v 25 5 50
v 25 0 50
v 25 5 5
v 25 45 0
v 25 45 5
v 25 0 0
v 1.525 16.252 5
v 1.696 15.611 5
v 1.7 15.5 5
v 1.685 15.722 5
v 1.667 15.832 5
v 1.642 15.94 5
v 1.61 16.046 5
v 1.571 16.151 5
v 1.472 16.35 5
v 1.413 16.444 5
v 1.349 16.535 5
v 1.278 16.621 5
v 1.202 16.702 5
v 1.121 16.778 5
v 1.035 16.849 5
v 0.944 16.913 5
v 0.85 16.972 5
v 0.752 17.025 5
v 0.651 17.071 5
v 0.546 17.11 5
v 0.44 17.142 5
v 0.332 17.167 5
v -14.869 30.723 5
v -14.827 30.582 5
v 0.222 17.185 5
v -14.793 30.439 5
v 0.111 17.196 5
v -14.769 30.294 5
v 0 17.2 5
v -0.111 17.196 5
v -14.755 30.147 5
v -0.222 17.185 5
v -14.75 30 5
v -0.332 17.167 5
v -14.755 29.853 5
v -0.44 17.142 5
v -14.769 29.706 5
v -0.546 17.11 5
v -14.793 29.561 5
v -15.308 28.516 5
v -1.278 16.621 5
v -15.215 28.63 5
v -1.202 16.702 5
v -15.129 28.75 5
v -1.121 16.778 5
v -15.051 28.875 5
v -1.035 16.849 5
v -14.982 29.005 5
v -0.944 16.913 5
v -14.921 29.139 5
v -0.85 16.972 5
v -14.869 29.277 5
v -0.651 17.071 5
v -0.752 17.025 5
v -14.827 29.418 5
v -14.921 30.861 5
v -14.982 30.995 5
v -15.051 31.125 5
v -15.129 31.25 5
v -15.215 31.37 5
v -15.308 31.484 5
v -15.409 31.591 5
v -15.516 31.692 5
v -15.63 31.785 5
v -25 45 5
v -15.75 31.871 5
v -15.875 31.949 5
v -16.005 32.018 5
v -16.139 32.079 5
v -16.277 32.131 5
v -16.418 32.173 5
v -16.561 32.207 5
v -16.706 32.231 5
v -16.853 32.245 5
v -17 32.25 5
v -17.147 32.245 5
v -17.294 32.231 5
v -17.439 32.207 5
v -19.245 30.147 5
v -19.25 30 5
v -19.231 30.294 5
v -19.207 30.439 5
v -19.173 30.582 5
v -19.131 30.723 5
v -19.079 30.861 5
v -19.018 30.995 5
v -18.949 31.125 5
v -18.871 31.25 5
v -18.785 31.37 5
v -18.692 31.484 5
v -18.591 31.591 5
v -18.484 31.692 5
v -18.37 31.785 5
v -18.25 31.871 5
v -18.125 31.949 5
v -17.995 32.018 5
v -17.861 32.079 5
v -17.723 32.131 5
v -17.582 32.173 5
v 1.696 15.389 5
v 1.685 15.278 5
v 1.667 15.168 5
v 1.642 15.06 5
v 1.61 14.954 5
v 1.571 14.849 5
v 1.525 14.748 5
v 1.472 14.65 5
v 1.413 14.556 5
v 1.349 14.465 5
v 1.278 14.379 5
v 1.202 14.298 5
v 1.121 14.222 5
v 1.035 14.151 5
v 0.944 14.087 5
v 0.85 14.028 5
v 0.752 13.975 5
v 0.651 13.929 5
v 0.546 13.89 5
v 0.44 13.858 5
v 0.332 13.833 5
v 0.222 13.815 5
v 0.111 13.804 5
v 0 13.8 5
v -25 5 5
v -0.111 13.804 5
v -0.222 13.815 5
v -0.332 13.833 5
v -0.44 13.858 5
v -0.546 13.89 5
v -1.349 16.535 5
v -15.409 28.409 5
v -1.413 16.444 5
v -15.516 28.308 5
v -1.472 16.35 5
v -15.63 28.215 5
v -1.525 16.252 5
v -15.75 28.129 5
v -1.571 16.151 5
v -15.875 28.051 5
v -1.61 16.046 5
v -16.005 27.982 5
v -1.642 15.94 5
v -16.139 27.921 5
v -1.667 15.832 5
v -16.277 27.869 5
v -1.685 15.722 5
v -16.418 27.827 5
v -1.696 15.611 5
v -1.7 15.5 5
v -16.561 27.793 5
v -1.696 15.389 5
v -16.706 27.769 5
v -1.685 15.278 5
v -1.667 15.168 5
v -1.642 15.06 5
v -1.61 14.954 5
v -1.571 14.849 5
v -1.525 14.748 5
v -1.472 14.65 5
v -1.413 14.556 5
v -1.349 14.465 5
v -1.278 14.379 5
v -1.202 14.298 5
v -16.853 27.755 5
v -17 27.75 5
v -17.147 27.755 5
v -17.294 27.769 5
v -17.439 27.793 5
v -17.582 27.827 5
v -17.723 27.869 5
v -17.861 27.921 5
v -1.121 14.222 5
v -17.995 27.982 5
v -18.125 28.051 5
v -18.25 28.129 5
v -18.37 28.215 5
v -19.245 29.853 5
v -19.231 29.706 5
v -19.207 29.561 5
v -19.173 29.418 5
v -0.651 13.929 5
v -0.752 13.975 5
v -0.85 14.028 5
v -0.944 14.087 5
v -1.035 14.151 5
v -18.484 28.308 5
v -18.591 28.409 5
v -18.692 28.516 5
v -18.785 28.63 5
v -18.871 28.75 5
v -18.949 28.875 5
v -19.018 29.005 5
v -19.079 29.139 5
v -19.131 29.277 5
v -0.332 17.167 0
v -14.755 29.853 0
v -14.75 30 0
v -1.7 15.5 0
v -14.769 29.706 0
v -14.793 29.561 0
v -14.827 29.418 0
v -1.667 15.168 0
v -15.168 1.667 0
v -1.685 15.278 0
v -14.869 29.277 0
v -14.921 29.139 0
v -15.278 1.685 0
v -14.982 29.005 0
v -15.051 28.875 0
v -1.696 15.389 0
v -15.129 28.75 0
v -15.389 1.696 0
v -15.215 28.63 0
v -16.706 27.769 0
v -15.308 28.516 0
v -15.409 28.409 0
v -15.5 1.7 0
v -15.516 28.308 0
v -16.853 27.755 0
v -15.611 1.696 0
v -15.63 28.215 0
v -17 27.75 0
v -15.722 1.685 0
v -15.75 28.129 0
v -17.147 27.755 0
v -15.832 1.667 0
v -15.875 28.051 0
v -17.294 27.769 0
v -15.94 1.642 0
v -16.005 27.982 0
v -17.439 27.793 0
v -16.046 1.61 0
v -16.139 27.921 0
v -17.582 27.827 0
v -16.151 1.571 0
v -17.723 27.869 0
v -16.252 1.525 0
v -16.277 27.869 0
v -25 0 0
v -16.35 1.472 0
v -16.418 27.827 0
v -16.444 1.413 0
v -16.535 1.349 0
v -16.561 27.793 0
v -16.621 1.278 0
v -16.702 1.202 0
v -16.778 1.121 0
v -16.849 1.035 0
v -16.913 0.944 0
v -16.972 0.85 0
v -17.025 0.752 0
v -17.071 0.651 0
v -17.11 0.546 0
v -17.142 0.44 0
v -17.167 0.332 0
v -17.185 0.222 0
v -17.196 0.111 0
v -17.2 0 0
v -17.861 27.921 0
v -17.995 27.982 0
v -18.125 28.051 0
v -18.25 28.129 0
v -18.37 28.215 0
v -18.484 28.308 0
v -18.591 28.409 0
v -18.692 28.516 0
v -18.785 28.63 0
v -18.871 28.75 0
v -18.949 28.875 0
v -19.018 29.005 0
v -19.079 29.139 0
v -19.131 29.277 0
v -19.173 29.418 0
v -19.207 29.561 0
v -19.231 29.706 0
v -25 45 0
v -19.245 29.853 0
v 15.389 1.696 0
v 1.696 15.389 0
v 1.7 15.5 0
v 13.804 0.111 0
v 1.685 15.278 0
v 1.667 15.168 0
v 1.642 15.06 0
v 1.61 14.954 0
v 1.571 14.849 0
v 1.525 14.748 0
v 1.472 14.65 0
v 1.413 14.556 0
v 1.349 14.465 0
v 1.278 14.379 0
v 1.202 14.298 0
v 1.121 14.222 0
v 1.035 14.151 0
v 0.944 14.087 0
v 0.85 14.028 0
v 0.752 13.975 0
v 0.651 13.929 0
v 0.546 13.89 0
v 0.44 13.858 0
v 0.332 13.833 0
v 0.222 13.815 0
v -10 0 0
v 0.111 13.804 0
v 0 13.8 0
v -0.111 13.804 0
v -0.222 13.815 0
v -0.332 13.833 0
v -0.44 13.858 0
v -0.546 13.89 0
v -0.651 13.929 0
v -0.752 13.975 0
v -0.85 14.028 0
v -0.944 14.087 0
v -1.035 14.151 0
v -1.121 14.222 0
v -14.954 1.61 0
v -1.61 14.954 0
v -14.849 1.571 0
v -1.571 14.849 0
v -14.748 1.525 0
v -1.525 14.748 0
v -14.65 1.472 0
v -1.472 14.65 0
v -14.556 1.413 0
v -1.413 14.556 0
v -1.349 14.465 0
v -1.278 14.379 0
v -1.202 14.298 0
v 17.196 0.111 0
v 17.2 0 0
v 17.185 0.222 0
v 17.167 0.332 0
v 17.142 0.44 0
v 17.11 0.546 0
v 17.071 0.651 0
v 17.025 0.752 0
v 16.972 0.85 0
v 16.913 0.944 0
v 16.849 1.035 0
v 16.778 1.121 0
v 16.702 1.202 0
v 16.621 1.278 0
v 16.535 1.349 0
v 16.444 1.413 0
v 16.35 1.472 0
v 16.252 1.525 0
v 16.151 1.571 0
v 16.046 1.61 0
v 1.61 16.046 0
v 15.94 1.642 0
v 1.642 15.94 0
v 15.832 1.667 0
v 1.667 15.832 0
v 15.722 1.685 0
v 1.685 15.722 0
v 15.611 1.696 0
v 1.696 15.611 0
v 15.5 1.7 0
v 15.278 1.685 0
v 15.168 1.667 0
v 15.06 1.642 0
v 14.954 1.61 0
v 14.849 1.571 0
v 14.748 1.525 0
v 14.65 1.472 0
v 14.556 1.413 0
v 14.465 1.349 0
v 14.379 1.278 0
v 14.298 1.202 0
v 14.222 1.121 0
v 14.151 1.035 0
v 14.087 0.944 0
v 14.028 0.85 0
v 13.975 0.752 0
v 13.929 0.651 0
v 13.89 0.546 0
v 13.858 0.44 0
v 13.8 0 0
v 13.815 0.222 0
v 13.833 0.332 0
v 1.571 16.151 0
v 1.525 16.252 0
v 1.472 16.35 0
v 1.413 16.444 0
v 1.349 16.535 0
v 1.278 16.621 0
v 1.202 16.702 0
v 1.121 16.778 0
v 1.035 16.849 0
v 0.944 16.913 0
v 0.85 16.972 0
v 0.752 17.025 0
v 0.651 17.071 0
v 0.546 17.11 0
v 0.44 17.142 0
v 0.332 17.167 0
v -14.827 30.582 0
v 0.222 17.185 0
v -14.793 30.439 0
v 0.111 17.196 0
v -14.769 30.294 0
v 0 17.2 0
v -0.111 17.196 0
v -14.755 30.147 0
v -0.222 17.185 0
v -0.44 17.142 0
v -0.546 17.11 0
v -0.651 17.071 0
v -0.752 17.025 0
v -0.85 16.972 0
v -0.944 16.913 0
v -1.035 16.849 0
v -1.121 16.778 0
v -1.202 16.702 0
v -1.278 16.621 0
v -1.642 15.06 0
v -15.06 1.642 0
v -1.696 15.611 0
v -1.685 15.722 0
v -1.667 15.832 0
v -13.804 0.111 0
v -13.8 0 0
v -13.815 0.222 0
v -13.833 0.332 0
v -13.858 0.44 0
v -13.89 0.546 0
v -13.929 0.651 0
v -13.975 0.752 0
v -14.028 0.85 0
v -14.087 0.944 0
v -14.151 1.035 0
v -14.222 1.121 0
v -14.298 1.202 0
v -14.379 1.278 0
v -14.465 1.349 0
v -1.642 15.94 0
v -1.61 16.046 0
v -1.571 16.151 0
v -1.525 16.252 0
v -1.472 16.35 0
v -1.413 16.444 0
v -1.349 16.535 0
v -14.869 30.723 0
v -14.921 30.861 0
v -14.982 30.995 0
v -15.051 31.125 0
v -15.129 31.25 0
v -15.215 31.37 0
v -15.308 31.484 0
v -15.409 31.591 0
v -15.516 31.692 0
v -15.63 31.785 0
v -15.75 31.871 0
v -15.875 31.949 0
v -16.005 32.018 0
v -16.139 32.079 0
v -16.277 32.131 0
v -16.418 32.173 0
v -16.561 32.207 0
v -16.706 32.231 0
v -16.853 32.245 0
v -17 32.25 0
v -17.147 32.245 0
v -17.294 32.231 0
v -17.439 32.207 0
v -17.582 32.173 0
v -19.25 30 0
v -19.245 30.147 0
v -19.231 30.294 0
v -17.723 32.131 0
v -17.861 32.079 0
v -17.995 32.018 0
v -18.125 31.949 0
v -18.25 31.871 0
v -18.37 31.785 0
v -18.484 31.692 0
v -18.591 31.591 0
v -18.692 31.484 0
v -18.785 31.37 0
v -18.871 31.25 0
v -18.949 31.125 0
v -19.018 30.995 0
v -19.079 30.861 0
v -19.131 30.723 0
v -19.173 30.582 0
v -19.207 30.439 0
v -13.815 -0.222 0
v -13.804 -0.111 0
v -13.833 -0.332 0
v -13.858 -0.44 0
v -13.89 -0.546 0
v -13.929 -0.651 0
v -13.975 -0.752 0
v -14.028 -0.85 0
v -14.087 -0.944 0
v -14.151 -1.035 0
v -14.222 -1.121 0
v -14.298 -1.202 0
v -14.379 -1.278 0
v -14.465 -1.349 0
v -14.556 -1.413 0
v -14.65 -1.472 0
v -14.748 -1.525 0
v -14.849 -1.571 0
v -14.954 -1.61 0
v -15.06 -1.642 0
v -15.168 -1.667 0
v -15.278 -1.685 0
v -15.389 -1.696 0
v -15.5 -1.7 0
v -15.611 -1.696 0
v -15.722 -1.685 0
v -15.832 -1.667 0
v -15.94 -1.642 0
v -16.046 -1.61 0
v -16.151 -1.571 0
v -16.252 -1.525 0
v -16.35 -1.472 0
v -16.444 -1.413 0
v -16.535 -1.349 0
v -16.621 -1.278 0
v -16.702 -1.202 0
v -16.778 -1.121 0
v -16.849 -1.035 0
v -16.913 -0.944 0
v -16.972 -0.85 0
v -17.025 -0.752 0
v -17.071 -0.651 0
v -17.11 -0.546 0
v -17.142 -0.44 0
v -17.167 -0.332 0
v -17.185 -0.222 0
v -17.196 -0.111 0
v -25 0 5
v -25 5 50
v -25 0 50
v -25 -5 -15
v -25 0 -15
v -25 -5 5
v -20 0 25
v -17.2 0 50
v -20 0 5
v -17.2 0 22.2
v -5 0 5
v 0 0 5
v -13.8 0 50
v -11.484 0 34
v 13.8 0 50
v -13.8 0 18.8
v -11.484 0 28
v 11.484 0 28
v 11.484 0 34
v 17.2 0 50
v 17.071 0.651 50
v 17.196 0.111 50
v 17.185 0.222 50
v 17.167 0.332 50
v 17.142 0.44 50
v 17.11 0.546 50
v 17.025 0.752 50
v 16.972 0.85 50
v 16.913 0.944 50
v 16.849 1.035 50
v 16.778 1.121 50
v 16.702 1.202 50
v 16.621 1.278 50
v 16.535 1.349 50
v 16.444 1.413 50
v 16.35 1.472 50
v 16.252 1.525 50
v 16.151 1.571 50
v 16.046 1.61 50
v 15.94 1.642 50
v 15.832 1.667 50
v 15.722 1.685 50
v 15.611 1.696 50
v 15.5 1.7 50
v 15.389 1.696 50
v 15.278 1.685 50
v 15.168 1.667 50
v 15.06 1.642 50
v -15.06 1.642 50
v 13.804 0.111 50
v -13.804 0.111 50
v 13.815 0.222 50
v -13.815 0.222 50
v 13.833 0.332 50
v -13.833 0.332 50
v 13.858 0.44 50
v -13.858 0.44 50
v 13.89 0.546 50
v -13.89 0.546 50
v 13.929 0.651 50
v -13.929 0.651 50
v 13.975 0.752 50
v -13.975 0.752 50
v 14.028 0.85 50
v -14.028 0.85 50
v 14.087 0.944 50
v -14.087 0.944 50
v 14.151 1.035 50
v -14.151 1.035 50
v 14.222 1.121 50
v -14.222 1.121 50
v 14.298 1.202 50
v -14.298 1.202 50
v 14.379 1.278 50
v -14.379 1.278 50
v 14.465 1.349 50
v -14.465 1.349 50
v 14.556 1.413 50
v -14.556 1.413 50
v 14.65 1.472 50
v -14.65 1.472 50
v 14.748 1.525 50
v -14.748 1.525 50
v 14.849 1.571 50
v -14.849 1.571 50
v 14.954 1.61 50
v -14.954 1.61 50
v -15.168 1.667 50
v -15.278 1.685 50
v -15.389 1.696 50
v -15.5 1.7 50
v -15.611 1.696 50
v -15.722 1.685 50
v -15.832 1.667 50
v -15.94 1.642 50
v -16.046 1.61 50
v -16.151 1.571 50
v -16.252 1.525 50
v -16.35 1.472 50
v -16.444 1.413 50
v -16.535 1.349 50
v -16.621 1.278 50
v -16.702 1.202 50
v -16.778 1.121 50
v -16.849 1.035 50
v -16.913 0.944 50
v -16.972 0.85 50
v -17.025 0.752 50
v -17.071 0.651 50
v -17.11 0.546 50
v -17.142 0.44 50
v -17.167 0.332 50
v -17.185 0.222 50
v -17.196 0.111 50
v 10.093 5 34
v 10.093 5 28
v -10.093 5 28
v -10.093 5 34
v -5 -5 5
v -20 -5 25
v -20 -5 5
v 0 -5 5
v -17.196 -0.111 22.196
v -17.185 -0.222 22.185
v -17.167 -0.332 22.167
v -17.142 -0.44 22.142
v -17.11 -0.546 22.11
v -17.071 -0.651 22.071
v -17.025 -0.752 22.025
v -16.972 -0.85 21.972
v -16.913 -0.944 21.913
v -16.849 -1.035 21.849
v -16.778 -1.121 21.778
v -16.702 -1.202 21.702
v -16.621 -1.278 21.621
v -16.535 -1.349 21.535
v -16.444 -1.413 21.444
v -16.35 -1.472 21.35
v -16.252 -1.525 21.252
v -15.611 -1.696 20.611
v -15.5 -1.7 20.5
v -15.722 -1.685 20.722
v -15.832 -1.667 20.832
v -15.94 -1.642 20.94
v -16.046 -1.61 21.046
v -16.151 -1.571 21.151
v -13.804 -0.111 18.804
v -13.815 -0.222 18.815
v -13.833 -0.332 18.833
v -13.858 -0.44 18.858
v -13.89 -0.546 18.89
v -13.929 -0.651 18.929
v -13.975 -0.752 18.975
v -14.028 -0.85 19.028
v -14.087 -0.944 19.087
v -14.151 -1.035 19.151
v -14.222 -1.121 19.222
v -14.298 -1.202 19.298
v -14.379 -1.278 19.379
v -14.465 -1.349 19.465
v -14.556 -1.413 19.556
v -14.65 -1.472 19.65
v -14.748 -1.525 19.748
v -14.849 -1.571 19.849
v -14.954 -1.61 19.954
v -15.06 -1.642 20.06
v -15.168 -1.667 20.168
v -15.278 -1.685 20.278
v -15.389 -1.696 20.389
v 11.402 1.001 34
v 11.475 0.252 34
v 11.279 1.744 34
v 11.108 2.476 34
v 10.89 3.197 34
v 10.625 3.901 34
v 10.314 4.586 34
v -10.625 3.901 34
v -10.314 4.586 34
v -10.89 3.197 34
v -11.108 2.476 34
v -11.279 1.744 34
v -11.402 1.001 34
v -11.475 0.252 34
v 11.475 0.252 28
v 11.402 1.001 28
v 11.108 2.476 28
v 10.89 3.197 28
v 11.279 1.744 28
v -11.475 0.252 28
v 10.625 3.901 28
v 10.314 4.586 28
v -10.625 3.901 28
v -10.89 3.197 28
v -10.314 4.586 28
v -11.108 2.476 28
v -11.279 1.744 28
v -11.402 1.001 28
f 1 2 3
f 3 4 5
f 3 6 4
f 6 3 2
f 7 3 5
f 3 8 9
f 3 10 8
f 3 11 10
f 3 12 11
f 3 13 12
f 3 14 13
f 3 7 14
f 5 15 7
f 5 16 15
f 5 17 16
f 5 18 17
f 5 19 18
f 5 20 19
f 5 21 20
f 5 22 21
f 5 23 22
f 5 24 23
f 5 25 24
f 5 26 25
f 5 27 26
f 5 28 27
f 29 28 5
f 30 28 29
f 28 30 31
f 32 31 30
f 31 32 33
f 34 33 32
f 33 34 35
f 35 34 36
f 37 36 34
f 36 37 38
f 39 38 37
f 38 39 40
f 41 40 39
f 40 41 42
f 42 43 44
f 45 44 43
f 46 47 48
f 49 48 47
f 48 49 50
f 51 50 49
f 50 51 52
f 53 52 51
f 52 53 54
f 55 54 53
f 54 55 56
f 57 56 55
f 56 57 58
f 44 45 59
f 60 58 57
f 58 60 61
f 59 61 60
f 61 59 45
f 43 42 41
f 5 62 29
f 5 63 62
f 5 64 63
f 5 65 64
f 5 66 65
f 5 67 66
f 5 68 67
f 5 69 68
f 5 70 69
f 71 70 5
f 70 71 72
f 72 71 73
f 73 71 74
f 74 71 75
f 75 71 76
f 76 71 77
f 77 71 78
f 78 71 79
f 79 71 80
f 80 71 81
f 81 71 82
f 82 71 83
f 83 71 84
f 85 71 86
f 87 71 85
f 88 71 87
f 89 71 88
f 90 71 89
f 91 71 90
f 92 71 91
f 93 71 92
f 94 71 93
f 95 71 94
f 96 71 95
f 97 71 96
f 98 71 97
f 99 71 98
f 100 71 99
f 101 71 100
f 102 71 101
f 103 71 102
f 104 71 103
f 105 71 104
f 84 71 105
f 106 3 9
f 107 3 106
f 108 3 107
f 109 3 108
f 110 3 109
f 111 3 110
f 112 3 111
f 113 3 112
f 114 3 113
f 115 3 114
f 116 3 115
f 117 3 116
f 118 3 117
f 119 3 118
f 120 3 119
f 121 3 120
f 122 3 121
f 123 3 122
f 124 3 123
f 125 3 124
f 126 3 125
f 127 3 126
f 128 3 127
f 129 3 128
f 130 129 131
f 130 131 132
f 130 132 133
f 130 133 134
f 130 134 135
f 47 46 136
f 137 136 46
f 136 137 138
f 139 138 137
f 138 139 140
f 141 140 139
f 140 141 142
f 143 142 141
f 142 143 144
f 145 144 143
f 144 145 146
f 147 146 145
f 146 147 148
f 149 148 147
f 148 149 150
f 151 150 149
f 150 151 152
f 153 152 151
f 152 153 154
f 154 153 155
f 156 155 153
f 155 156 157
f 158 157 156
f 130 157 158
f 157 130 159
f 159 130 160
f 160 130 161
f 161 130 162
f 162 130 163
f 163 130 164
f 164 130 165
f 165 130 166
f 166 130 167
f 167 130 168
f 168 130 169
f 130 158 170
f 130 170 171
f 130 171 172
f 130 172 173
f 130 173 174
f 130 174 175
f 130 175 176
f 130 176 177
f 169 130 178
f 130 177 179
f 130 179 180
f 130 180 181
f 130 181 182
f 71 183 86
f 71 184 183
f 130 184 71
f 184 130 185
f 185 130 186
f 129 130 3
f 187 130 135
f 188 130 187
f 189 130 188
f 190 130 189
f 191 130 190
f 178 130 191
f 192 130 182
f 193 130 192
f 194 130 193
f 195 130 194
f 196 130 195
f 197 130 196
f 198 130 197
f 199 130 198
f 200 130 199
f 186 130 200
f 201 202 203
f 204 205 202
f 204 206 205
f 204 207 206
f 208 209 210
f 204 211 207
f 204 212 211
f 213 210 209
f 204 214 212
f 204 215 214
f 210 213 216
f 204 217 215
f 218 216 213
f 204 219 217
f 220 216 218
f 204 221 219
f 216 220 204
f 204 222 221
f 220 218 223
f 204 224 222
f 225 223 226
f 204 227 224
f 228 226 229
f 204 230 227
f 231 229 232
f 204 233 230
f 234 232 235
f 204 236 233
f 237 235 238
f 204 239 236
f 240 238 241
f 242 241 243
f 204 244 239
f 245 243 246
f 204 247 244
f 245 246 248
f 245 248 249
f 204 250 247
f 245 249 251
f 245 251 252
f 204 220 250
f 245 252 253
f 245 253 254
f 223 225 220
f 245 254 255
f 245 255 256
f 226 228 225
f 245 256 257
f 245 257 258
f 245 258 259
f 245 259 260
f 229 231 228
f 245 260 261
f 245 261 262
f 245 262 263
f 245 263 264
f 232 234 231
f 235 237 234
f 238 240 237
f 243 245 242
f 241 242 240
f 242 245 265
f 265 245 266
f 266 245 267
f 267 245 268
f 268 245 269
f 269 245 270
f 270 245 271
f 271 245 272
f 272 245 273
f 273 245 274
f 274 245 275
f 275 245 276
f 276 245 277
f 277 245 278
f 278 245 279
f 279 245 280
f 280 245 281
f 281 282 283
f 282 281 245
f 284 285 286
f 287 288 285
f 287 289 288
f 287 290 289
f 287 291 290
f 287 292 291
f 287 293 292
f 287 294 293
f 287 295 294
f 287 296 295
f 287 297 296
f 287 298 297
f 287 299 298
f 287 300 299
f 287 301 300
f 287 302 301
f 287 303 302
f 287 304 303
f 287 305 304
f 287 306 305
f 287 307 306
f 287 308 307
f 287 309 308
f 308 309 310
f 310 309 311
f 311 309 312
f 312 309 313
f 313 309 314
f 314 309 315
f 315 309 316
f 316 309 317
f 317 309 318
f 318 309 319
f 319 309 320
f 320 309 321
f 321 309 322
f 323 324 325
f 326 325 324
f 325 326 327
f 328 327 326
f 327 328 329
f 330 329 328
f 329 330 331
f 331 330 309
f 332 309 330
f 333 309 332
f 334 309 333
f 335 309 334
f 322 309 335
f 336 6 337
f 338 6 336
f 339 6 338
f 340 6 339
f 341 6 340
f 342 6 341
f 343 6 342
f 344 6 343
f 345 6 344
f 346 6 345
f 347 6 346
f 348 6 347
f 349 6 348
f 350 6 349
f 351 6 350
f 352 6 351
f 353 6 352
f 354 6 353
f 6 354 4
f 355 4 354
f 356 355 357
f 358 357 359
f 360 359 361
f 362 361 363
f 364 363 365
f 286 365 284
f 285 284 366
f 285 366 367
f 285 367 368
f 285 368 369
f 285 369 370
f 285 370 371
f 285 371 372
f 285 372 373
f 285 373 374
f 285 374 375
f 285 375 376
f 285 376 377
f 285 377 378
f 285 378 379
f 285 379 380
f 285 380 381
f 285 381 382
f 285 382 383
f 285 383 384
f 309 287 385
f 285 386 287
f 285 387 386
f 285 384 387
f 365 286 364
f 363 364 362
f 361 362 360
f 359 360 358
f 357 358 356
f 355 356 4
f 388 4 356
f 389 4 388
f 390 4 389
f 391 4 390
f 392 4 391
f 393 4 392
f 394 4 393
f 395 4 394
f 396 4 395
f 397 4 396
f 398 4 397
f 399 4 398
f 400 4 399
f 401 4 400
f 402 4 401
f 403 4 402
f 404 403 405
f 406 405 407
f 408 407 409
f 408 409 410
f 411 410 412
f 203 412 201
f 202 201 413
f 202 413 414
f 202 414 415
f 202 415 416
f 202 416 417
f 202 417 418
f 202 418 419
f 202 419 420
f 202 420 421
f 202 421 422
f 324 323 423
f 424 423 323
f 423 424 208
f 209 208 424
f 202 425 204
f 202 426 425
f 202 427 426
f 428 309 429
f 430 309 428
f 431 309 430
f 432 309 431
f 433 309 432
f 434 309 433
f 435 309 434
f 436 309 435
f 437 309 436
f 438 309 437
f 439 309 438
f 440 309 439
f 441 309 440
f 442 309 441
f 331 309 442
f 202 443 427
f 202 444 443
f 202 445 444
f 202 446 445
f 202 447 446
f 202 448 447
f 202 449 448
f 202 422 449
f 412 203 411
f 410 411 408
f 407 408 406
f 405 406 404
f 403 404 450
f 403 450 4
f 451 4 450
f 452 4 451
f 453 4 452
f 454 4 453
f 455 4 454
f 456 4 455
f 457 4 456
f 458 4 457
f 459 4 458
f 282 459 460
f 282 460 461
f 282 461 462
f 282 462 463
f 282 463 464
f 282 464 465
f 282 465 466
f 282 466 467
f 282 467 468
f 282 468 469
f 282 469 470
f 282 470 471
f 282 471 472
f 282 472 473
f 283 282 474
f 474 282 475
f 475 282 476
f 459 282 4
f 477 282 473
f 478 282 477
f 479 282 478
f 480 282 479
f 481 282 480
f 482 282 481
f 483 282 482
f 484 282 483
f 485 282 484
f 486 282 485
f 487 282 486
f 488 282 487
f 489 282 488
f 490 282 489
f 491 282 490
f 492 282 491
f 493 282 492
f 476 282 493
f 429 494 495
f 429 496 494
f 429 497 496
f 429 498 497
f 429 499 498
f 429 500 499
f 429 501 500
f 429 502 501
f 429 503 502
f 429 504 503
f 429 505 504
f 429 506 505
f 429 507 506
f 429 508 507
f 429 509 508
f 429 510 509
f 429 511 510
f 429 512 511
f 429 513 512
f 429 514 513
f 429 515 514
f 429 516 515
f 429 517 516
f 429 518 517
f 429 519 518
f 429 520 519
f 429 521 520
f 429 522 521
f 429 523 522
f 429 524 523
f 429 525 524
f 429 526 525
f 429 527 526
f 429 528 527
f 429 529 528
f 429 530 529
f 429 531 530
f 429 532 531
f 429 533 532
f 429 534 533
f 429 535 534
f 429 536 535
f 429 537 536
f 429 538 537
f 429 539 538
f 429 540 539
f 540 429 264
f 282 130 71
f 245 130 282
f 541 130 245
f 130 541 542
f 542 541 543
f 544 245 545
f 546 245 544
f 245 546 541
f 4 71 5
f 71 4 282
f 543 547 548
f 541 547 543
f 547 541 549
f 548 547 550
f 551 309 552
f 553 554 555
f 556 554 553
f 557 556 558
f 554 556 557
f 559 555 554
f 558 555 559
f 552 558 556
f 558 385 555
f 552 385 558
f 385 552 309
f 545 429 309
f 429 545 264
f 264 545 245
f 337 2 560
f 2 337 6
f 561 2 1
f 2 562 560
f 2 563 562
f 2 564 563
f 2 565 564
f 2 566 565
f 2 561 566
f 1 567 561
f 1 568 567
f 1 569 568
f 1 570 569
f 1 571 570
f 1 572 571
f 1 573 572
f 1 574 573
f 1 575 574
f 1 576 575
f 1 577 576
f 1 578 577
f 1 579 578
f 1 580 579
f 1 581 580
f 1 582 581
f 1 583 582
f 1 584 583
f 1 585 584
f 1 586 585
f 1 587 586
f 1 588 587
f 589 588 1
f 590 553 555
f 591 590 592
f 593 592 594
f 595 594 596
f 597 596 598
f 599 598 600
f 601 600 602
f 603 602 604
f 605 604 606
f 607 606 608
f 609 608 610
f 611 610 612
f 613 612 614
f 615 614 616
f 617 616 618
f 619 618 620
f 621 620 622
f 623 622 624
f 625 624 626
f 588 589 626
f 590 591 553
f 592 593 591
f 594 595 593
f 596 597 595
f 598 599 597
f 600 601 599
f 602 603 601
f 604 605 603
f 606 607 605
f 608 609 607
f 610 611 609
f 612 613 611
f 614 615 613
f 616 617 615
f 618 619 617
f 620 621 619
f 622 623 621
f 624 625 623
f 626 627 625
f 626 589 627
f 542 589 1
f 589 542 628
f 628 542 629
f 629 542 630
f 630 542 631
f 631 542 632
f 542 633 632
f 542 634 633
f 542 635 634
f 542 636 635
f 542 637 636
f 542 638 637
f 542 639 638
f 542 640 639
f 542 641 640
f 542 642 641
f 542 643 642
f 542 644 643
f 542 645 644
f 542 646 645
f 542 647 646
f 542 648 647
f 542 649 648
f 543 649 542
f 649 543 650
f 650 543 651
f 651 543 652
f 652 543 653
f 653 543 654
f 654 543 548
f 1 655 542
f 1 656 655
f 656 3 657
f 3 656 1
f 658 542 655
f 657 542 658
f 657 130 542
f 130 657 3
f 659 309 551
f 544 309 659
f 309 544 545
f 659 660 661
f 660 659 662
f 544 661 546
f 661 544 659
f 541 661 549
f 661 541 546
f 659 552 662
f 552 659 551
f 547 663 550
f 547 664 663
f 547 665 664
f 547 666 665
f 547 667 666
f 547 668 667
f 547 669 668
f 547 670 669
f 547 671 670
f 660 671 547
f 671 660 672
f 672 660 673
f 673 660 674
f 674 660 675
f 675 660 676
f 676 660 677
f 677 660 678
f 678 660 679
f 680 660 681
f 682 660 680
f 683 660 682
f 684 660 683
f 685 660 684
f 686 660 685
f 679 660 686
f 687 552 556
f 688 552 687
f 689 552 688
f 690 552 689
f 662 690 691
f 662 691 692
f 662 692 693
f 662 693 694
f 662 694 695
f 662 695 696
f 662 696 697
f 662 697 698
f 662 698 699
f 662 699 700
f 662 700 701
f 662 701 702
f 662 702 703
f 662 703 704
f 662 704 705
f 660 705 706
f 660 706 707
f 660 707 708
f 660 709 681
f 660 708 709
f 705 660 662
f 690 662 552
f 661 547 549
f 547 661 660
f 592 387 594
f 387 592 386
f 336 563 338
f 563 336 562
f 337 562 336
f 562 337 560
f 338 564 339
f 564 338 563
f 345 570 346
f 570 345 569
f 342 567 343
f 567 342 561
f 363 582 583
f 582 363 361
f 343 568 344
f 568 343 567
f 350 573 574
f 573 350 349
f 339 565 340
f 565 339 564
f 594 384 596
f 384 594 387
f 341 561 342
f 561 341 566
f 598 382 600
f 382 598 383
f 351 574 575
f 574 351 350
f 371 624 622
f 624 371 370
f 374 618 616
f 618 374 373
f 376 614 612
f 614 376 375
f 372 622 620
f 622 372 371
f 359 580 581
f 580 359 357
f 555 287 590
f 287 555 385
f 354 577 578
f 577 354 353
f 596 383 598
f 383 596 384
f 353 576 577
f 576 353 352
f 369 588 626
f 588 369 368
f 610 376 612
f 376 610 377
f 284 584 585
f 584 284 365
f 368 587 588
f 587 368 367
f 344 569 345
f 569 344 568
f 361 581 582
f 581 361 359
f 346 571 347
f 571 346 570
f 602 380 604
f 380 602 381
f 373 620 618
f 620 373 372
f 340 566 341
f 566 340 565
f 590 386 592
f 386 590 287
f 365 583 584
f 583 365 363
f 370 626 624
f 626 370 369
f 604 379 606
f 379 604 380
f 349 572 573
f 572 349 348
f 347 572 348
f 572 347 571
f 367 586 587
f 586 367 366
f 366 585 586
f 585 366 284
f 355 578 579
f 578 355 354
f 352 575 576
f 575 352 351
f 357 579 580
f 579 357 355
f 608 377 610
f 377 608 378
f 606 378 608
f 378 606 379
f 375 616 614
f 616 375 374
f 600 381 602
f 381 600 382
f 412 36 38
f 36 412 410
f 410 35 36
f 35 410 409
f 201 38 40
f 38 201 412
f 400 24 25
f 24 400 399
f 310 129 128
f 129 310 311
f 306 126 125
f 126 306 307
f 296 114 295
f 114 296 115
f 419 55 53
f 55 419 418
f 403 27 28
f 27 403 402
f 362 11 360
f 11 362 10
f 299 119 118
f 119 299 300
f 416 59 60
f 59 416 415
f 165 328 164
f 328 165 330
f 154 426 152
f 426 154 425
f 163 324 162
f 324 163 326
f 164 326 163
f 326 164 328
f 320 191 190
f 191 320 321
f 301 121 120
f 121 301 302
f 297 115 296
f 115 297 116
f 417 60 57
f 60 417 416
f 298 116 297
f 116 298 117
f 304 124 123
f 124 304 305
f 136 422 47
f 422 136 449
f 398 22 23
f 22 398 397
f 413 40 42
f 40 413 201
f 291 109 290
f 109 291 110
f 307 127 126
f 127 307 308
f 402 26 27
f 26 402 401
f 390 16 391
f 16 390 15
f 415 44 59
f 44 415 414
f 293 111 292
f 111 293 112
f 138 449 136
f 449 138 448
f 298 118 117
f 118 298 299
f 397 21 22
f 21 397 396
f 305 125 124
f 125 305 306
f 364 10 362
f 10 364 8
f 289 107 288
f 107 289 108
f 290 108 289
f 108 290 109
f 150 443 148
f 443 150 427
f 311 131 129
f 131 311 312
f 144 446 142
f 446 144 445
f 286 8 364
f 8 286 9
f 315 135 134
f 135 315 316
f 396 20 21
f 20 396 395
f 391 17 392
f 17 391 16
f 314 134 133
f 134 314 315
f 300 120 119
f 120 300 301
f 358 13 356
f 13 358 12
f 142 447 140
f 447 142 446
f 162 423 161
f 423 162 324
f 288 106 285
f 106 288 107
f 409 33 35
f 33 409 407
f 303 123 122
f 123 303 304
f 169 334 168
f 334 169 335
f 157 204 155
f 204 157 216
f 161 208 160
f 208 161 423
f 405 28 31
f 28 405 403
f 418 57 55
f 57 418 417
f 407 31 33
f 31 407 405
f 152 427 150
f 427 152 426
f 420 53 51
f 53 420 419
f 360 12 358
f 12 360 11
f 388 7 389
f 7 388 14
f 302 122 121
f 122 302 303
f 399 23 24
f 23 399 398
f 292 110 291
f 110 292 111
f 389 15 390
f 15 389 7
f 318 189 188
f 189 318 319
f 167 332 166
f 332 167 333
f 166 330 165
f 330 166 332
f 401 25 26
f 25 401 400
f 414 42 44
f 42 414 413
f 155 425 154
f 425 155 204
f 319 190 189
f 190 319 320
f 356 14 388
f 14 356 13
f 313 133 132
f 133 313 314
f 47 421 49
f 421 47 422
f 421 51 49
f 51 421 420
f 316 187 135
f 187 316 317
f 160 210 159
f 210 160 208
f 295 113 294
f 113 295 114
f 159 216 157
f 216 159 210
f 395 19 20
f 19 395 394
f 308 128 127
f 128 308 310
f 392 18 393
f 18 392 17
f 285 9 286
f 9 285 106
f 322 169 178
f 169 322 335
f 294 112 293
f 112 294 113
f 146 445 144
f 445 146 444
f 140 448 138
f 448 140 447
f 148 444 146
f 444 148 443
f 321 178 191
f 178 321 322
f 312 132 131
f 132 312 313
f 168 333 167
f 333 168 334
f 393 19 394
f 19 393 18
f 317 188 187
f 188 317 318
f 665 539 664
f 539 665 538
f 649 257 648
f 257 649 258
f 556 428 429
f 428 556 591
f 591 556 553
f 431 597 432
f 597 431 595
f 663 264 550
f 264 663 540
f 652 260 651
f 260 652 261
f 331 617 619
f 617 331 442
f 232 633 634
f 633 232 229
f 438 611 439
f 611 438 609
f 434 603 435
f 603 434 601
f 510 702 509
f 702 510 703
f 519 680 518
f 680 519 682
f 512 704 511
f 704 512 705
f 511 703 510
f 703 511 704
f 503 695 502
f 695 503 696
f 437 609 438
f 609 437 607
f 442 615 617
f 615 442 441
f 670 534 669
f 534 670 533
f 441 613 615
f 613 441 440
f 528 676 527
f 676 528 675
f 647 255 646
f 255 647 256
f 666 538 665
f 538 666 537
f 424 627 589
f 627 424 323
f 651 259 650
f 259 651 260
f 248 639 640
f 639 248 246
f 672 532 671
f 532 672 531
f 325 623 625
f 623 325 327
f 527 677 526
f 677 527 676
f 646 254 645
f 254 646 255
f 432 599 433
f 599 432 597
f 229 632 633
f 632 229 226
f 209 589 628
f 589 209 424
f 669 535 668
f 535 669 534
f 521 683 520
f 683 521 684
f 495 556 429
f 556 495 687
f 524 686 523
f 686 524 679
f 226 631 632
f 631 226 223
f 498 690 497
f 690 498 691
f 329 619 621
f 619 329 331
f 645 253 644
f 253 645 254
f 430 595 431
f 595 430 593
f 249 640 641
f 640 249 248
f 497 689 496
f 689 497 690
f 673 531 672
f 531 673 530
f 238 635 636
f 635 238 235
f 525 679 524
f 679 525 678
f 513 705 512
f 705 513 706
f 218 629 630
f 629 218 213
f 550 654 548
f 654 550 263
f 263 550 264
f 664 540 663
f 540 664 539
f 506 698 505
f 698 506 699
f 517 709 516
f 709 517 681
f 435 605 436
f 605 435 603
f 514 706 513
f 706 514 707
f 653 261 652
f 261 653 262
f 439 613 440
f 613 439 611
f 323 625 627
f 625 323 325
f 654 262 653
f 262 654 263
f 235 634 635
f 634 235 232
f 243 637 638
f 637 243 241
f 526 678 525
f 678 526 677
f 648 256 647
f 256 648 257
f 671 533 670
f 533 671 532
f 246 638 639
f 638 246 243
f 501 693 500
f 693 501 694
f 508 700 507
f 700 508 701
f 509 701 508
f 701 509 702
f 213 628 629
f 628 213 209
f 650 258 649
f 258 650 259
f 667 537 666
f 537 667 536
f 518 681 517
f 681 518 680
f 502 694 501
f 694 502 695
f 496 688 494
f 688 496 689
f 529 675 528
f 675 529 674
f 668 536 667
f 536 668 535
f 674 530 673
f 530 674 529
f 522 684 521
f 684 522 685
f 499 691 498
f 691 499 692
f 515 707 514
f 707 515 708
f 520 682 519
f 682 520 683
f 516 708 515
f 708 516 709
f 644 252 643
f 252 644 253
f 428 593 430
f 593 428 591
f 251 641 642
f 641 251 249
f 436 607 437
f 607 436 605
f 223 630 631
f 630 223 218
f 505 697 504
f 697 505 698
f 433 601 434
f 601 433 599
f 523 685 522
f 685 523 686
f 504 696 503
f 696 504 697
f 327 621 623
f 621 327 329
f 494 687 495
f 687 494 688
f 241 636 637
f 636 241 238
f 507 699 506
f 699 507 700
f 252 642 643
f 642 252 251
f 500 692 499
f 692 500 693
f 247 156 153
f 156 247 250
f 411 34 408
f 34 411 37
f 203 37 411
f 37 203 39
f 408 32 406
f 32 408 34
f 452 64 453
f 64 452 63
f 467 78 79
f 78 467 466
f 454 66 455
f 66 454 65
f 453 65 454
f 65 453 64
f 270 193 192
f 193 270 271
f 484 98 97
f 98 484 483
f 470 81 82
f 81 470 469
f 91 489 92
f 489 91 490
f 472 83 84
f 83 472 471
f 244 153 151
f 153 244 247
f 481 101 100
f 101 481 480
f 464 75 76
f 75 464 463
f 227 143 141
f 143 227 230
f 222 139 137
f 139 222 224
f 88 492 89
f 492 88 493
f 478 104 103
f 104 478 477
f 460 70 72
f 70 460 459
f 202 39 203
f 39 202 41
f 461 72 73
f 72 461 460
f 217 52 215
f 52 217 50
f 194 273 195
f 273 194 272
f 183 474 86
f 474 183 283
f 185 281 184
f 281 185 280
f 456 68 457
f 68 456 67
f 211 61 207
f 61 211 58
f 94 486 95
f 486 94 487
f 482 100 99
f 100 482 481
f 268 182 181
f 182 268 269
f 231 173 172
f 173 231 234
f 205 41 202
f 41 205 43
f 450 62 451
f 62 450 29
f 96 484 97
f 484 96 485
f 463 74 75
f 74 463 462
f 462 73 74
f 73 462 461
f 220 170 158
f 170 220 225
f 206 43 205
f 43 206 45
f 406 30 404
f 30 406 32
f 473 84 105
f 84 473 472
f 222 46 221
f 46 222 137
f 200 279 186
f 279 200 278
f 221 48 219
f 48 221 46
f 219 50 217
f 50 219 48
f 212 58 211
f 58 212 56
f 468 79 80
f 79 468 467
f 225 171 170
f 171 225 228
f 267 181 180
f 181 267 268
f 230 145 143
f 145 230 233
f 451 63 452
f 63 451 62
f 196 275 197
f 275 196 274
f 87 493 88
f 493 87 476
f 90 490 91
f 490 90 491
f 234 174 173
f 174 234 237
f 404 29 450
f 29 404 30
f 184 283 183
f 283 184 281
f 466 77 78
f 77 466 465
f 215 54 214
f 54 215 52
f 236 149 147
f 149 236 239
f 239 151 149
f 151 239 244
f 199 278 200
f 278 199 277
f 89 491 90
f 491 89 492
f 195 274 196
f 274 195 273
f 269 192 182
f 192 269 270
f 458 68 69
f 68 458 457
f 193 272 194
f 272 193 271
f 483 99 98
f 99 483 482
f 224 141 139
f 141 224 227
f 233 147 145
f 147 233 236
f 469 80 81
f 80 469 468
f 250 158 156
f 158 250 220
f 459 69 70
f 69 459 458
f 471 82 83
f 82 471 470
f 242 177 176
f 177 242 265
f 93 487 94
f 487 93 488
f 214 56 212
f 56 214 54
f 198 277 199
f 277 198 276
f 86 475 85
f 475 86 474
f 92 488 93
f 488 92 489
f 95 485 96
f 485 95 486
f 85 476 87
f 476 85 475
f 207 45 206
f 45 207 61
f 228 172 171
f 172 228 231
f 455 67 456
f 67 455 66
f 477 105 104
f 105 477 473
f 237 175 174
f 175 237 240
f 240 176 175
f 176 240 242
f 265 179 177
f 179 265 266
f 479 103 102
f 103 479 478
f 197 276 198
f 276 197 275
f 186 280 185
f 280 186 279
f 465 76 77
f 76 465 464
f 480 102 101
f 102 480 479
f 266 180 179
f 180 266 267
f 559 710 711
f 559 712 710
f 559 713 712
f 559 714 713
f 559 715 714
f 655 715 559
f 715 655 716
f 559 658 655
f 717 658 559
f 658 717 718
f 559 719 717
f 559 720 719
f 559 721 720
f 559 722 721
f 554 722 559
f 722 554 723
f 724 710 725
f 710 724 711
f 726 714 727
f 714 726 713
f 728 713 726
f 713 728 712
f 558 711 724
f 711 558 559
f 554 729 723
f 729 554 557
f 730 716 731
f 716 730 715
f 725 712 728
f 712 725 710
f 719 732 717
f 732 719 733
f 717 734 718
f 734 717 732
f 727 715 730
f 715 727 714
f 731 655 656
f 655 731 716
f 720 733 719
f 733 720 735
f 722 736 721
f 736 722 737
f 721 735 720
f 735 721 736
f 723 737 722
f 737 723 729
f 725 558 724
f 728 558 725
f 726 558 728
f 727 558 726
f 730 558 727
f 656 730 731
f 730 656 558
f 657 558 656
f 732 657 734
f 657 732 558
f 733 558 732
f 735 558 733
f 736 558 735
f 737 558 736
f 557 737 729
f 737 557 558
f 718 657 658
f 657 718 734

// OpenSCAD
// L-shaped mounting bracket for a NEMA 17 stepper motor (e.g. syringe pump)
// Print orientation: base plate on the bed (z = 0), motor plate builds upward.

// ---------------- Parameters ----------------
base_x0      = -25;    // base plate: x start
base_x1      = 25;     // base plate: x end
base_y0      = 0;      // base plate: y start
base_y1      = 45;     // base plate: y end
base_z0      = 0;      // base plate: z start
base_z1      = 5;      // base plate: z end

hole_x       = -17;    // M4 through-hole x position
hole_y       = 30;     // M4 through-hole y position
hole_d       = 4.5;    // M4 hole diameter

motor_x0     = -25;    // motor plate: x start
motor_x1     = 25;     // motor plate: x end
motor_y0     = 0;      // motor plate: y start
motor_y1     = 5;      // motor plate: y end (on back edge of base)
motor_z0     = 0;      // motor plate: z start
motor_z1     = 50;     // motor plate: z end

boss_d       = 23;     // motor centring boss hole diameter
boss_x       = 0;      // boss hole centre x
boss_z       = 28;     // boss hole centre z

screw_d      = 3.4;    // M3 screw hole diameter
screw_p      = 31;     // square pattern side length for screws

gusset_t     = 5;      // gusset thickness (X)
gusset_leg   = 20;     // right-triangle leg length (Y and Z)
gusset_x0    = -25;    // left gusset x start
gusset_x1    = -20;    // left gusset x end

eps          = 0.5;    // cutter overshoot past faces

$fn = 96;

// ---------------- Model ----------------
difference() {
    union() {
        // Base plate
        translate([base_x0, base_y0, base_z0])
            cube([base_x1 - base_x0, base_y1 - base_y0, base_z1 - base_z0]);

        // Vertical motor plate
        translate([motor_x0, motor_y0, motor_z0])
            cube([motor_x1 - motor_x0, motor_y1 - motor_y0, motor_z1 - motor_z0]);

        // Left gusset: right triangle in YZ, right angle at (y=5, z=5)
        translate([gusset_x0, 0, 0])
            rotate([90, 0, 0])
                linear_extrude(height = gusset_t)
                    polygon([[0, 5], [gusset_leg, 5], [0, 5 - gusset_leg]]);

        // Right gusset: right triangle in YZ, right angle at (y=5, z=5)
        translate([gusset_x1, 0, 0])
            rotate([90, 0, 0])
                linear_extrude(height = gusset_t)
                    polygon([[0, 5], [gusset_leg, 5], [0, 5 + gusset_leg]]);
    }

    // M4 through-holes in base plate
    translate([hole_x, hole_y, -eps])
        cylinder(d = hole_d, h = base_z1 - base_z0 + 2 * eps);

    // Motor boss hole through motor plate (along Y)
    translate([boss_x, motor_y0 - eps, boss_z])
        cylinder(d = boss_d, h = motor_y1 - motor_y0 + 2 * eps);

    // M3 screw holes on a 31 mm square pattern, centred on the boss hole
    for (a = [0, 90, 180, 270])
        rotate([0, 0, a])
            translate([screw_p / 2, 0, 0])
                cylinder(d = screw_d, h = motor_z1 - motor_z0 + eps);
}
